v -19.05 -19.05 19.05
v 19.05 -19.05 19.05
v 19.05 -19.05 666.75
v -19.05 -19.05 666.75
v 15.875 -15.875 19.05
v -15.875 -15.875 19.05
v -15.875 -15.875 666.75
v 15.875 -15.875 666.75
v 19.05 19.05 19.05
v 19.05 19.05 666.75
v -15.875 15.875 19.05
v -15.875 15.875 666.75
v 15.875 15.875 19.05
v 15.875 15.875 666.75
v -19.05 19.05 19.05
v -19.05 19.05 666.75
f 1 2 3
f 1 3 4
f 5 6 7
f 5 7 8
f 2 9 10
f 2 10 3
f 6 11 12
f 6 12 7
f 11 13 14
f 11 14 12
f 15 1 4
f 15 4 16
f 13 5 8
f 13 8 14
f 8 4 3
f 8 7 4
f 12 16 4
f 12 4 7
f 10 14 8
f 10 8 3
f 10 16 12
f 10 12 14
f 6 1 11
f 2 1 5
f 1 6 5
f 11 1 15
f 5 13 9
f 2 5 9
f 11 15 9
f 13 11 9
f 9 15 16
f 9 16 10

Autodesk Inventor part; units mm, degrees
ref_plane "Start Plane" through (0, 0, 19.05) normal (0, 0, 1) x (1, 0, 0)
ref_plane "End Plane" through (0, 0, 666.75) normal (0, 0, 1) x (1, 0, 0)
sketch "Sketch" plane through (0, 0, 0) normal (0, 0, 1) x (1, 0, 0)
  line L0 (-19.05, 19.05) -> (19.05, 19.05)
  line L1 (19.05, 19.05) -> (19.05, -19.05)
  line L2 (19.05, -19.05) -> (-19.05, -19.05)
  line L3 (-19.05, -19.05) -> (-19.05, 19.05)
  line L4 (15.875, 15.875) -> (-15.875, 15.875)
  line L5 (-15.875, 15.875) -> (-15.875, -15.875)
  line L6 (-15.875, -15.875) -> (15.875, -15.875)
  line L7 (15.875, -15.875) -> (15.875, 15.875)
  point P0 (0, 0)
  point P1 (0, 19.05)
  point P2 (-19.05, 0)
  dimension "width" = 38.1
  dimension "d1" = 3.175
extrude "Body" add sketch "Sketch" along normal up to surface (647.7 mm away) from surface at 19.05
sketch "Sketch4" plane through (0, 0, 0) normal (0, 0, 1) x (1, 0, 0)
  line L0 (0, 0) -> (10, 0)
ref_plane "Work Plane4" through (0, 0, 0) normal (0, -1, 0) x (1, 0, 0)
sketch "Sketch5" plane through (0, 0, 0) normal (0, -1, 0) x (1, 0, 0)
  line L0 (-2, 19.05) -> (12, 19.05)
  line L1 (-2, 666.75) -> (12, 666.75)
  dimension "d9" = 647.7
ref_plane "Work Plane5" through (-406.4, 19.05, 666.75) normal (0, 0, 1) x (1, 0, 0)
split "Split1" plane through (-406.4, 19.05, 666.75) removes the side toward (0, 0, 1)
ref_plane "Work Plane6" through (762, 19.05, 19.05) normal (0, 0, -1) x (-1, 0, 0)
split "Split2" plane through (762, 19.05, 19.05) removes the side toward (0, 0, -1)
equation "\"G_OFFSET_START\" = -19.05"
equation "\"G_OFFSET_END\" = -19.05"
equation "\"d4\" = -G_OFFSET_START"
equation "\"d5\" = length + G_OFFSET_END"
equation "\"G_L\" = 723.9"
equation "\"length\" = 685.8"
properties part number "1.5x1.5x.125 Tube" material "Aluminum-6061"
